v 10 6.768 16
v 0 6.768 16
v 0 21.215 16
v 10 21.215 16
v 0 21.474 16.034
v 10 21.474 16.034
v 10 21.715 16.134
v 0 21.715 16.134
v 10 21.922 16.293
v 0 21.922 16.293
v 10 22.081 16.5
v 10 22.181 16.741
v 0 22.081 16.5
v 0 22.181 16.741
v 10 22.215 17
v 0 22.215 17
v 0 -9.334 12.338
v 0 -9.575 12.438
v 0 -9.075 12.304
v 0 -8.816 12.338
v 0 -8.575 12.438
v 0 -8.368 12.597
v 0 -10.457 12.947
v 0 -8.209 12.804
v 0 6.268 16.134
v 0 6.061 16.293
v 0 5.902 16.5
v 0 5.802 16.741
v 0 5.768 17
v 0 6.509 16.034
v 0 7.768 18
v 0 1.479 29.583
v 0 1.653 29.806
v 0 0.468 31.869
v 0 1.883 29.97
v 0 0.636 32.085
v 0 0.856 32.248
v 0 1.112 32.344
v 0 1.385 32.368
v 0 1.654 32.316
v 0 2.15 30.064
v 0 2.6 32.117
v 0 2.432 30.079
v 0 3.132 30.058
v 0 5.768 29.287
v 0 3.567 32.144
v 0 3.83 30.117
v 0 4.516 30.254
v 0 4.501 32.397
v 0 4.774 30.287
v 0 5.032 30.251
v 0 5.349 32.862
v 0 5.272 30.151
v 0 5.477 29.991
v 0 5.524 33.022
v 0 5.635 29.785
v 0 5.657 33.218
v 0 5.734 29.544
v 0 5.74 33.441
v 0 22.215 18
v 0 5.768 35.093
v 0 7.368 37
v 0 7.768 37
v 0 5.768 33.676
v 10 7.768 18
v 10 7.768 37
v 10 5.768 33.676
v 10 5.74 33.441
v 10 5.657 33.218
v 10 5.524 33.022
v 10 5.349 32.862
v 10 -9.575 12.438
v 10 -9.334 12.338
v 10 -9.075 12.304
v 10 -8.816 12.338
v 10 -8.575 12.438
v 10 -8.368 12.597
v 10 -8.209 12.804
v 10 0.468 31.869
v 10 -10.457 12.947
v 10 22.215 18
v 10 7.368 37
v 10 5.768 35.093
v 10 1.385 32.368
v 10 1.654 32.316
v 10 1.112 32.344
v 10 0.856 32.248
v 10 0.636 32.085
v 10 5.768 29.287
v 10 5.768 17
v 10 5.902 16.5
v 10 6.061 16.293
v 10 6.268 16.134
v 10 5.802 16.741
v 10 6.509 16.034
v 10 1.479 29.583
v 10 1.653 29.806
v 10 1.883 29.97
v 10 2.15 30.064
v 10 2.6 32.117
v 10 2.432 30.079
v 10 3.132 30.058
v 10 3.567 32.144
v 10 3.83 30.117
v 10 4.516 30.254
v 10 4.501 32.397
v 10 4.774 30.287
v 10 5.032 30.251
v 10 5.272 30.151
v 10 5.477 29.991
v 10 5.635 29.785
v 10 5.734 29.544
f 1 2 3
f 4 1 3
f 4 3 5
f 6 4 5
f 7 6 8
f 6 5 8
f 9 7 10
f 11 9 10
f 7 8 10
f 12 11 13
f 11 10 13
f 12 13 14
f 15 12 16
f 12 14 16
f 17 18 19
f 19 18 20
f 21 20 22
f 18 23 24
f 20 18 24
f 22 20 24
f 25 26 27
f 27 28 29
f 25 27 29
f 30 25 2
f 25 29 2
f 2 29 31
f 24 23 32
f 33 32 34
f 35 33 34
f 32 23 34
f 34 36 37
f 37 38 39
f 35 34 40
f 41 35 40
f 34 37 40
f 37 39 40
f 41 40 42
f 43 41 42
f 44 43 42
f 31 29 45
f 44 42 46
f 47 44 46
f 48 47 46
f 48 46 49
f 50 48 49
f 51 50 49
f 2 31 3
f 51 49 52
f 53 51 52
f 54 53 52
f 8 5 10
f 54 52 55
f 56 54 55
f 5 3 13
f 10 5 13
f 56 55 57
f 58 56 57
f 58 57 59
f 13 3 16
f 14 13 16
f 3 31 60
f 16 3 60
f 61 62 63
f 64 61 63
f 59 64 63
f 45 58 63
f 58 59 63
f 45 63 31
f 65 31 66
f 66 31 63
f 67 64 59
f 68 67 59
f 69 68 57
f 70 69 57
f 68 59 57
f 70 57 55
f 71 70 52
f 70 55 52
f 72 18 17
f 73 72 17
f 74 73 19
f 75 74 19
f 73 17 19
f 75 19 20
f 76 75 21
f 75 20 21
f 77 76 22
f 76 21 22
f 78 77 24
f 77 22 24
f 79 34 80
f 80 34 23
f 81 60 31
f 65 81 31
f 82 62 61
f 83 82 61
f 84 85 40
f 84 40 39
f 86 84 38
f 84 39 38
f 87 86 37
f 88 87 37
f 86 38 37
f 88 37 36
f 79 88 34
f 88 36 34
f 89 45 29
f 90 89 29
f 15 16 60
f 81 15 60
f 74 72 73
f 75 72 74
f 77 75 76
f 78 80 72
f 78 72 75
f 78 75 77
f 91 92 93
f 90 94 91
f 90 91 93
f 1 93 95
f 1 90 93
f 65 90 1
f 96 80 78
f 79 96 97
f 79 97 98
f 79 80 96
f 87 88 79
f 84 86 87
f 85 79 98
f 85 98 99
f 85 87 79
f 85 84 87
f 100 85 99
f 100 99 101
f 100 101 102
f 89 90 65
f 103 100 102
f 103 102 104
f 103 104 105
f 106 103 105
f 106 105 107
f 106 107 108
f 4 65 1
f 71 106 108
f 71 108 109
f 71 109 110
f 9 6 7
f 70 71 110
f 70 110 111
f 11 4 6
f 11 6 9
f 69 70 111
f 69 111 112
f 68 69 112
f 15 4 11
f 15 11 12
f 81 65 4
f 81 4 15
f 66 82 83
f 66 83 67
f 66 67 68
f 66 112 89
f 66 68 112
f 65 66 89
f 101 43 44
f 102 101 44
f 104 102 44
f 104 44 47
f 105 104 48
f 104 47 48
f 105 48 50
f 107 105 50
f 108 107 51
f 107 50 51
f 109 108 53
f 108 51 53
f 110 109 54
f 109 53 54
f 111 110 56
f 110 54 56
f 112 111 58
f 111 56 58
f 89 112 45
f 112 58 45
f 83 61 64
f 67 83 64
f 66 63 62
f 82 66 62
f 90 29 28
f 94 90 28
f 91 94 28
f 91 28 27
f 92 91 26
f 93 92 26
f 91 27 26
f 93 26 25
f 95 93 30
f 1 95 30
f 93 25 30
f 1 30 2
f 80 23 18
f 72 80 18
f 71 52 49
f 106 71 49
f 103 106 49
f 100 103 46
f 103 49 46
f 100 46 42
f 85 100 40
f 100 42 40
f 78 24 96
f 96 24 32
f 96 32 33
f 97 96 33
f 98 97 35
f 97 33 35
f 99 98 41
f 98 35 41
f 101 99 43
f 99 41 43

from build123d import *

# Parameters (mm, degrees)
F3_DEPTH = 10


with BuildPart() as f3:
    # F2 (on Right) → F3 (new body)
    with BuildSketch(Plane.YZ):
        with BuildLine():
            Line((7.768028, 18), (7.768028, 37))
            Line((7.768028, 37), (7.368028, 37))
            Line((7.368028, 37), (5.768028, 35.093194))
            Line((5.768028, 35.093194), (5.768028, 33.676114))
            ThreePointArc((5.768028, 33.676114), (5.657029, 33.218209), (5.348673, 32.861957))
            ThreePointArc((5.348673, 32.861957), (3.567098, 32.144003), (1.654039, 32.316261))
            ThreePointArc((1.654039, 32.316261), (0.980832, 32.304735), (0.467528, 31.869007))
            Line((0.467528, 31.869007), (-10.456972, 12.947218))
            Line((-10.456972, 12.947218), (-9.574866, 12.437934))
            ThreePointArc((-9.574866, 12.437934), (-8.816046, 12.338033), (-8.20884, 12.803959))
            Line((-8.20884, 12.803959), (1.478715, 29.583296))
            ThreePointArc((1.478715, 29.583296), (1.883032, 29.970328), (2.431987, 30.079483))
            ThreePointArc((2.431987, 30.079483), (3.481519, 30.07755), (4.516067, 30.254275))
            ThreePointArc((4.516067, 30.254275), (5.379599, 30.077727), (5.768028, 29.286538))
            Line((5.768028, 29.286538), (5.768028, 17))
            ThreePointArc((5.768028, 17), (6.060921, 16.292893), (6.768028, 16))
            Line((6.768028, 16), (21.214821, 16))
            ThreePointArc((21.214821, 16), (21.921927, 16.292893), (22.214821, 17))
            Line((22.214821, 17), (22.214821, 18))
            Line((22.214821, 18), (7.768028, 18))
        make_face()
    extrude(amount=F3_DEPTH)


solid = f3.part
